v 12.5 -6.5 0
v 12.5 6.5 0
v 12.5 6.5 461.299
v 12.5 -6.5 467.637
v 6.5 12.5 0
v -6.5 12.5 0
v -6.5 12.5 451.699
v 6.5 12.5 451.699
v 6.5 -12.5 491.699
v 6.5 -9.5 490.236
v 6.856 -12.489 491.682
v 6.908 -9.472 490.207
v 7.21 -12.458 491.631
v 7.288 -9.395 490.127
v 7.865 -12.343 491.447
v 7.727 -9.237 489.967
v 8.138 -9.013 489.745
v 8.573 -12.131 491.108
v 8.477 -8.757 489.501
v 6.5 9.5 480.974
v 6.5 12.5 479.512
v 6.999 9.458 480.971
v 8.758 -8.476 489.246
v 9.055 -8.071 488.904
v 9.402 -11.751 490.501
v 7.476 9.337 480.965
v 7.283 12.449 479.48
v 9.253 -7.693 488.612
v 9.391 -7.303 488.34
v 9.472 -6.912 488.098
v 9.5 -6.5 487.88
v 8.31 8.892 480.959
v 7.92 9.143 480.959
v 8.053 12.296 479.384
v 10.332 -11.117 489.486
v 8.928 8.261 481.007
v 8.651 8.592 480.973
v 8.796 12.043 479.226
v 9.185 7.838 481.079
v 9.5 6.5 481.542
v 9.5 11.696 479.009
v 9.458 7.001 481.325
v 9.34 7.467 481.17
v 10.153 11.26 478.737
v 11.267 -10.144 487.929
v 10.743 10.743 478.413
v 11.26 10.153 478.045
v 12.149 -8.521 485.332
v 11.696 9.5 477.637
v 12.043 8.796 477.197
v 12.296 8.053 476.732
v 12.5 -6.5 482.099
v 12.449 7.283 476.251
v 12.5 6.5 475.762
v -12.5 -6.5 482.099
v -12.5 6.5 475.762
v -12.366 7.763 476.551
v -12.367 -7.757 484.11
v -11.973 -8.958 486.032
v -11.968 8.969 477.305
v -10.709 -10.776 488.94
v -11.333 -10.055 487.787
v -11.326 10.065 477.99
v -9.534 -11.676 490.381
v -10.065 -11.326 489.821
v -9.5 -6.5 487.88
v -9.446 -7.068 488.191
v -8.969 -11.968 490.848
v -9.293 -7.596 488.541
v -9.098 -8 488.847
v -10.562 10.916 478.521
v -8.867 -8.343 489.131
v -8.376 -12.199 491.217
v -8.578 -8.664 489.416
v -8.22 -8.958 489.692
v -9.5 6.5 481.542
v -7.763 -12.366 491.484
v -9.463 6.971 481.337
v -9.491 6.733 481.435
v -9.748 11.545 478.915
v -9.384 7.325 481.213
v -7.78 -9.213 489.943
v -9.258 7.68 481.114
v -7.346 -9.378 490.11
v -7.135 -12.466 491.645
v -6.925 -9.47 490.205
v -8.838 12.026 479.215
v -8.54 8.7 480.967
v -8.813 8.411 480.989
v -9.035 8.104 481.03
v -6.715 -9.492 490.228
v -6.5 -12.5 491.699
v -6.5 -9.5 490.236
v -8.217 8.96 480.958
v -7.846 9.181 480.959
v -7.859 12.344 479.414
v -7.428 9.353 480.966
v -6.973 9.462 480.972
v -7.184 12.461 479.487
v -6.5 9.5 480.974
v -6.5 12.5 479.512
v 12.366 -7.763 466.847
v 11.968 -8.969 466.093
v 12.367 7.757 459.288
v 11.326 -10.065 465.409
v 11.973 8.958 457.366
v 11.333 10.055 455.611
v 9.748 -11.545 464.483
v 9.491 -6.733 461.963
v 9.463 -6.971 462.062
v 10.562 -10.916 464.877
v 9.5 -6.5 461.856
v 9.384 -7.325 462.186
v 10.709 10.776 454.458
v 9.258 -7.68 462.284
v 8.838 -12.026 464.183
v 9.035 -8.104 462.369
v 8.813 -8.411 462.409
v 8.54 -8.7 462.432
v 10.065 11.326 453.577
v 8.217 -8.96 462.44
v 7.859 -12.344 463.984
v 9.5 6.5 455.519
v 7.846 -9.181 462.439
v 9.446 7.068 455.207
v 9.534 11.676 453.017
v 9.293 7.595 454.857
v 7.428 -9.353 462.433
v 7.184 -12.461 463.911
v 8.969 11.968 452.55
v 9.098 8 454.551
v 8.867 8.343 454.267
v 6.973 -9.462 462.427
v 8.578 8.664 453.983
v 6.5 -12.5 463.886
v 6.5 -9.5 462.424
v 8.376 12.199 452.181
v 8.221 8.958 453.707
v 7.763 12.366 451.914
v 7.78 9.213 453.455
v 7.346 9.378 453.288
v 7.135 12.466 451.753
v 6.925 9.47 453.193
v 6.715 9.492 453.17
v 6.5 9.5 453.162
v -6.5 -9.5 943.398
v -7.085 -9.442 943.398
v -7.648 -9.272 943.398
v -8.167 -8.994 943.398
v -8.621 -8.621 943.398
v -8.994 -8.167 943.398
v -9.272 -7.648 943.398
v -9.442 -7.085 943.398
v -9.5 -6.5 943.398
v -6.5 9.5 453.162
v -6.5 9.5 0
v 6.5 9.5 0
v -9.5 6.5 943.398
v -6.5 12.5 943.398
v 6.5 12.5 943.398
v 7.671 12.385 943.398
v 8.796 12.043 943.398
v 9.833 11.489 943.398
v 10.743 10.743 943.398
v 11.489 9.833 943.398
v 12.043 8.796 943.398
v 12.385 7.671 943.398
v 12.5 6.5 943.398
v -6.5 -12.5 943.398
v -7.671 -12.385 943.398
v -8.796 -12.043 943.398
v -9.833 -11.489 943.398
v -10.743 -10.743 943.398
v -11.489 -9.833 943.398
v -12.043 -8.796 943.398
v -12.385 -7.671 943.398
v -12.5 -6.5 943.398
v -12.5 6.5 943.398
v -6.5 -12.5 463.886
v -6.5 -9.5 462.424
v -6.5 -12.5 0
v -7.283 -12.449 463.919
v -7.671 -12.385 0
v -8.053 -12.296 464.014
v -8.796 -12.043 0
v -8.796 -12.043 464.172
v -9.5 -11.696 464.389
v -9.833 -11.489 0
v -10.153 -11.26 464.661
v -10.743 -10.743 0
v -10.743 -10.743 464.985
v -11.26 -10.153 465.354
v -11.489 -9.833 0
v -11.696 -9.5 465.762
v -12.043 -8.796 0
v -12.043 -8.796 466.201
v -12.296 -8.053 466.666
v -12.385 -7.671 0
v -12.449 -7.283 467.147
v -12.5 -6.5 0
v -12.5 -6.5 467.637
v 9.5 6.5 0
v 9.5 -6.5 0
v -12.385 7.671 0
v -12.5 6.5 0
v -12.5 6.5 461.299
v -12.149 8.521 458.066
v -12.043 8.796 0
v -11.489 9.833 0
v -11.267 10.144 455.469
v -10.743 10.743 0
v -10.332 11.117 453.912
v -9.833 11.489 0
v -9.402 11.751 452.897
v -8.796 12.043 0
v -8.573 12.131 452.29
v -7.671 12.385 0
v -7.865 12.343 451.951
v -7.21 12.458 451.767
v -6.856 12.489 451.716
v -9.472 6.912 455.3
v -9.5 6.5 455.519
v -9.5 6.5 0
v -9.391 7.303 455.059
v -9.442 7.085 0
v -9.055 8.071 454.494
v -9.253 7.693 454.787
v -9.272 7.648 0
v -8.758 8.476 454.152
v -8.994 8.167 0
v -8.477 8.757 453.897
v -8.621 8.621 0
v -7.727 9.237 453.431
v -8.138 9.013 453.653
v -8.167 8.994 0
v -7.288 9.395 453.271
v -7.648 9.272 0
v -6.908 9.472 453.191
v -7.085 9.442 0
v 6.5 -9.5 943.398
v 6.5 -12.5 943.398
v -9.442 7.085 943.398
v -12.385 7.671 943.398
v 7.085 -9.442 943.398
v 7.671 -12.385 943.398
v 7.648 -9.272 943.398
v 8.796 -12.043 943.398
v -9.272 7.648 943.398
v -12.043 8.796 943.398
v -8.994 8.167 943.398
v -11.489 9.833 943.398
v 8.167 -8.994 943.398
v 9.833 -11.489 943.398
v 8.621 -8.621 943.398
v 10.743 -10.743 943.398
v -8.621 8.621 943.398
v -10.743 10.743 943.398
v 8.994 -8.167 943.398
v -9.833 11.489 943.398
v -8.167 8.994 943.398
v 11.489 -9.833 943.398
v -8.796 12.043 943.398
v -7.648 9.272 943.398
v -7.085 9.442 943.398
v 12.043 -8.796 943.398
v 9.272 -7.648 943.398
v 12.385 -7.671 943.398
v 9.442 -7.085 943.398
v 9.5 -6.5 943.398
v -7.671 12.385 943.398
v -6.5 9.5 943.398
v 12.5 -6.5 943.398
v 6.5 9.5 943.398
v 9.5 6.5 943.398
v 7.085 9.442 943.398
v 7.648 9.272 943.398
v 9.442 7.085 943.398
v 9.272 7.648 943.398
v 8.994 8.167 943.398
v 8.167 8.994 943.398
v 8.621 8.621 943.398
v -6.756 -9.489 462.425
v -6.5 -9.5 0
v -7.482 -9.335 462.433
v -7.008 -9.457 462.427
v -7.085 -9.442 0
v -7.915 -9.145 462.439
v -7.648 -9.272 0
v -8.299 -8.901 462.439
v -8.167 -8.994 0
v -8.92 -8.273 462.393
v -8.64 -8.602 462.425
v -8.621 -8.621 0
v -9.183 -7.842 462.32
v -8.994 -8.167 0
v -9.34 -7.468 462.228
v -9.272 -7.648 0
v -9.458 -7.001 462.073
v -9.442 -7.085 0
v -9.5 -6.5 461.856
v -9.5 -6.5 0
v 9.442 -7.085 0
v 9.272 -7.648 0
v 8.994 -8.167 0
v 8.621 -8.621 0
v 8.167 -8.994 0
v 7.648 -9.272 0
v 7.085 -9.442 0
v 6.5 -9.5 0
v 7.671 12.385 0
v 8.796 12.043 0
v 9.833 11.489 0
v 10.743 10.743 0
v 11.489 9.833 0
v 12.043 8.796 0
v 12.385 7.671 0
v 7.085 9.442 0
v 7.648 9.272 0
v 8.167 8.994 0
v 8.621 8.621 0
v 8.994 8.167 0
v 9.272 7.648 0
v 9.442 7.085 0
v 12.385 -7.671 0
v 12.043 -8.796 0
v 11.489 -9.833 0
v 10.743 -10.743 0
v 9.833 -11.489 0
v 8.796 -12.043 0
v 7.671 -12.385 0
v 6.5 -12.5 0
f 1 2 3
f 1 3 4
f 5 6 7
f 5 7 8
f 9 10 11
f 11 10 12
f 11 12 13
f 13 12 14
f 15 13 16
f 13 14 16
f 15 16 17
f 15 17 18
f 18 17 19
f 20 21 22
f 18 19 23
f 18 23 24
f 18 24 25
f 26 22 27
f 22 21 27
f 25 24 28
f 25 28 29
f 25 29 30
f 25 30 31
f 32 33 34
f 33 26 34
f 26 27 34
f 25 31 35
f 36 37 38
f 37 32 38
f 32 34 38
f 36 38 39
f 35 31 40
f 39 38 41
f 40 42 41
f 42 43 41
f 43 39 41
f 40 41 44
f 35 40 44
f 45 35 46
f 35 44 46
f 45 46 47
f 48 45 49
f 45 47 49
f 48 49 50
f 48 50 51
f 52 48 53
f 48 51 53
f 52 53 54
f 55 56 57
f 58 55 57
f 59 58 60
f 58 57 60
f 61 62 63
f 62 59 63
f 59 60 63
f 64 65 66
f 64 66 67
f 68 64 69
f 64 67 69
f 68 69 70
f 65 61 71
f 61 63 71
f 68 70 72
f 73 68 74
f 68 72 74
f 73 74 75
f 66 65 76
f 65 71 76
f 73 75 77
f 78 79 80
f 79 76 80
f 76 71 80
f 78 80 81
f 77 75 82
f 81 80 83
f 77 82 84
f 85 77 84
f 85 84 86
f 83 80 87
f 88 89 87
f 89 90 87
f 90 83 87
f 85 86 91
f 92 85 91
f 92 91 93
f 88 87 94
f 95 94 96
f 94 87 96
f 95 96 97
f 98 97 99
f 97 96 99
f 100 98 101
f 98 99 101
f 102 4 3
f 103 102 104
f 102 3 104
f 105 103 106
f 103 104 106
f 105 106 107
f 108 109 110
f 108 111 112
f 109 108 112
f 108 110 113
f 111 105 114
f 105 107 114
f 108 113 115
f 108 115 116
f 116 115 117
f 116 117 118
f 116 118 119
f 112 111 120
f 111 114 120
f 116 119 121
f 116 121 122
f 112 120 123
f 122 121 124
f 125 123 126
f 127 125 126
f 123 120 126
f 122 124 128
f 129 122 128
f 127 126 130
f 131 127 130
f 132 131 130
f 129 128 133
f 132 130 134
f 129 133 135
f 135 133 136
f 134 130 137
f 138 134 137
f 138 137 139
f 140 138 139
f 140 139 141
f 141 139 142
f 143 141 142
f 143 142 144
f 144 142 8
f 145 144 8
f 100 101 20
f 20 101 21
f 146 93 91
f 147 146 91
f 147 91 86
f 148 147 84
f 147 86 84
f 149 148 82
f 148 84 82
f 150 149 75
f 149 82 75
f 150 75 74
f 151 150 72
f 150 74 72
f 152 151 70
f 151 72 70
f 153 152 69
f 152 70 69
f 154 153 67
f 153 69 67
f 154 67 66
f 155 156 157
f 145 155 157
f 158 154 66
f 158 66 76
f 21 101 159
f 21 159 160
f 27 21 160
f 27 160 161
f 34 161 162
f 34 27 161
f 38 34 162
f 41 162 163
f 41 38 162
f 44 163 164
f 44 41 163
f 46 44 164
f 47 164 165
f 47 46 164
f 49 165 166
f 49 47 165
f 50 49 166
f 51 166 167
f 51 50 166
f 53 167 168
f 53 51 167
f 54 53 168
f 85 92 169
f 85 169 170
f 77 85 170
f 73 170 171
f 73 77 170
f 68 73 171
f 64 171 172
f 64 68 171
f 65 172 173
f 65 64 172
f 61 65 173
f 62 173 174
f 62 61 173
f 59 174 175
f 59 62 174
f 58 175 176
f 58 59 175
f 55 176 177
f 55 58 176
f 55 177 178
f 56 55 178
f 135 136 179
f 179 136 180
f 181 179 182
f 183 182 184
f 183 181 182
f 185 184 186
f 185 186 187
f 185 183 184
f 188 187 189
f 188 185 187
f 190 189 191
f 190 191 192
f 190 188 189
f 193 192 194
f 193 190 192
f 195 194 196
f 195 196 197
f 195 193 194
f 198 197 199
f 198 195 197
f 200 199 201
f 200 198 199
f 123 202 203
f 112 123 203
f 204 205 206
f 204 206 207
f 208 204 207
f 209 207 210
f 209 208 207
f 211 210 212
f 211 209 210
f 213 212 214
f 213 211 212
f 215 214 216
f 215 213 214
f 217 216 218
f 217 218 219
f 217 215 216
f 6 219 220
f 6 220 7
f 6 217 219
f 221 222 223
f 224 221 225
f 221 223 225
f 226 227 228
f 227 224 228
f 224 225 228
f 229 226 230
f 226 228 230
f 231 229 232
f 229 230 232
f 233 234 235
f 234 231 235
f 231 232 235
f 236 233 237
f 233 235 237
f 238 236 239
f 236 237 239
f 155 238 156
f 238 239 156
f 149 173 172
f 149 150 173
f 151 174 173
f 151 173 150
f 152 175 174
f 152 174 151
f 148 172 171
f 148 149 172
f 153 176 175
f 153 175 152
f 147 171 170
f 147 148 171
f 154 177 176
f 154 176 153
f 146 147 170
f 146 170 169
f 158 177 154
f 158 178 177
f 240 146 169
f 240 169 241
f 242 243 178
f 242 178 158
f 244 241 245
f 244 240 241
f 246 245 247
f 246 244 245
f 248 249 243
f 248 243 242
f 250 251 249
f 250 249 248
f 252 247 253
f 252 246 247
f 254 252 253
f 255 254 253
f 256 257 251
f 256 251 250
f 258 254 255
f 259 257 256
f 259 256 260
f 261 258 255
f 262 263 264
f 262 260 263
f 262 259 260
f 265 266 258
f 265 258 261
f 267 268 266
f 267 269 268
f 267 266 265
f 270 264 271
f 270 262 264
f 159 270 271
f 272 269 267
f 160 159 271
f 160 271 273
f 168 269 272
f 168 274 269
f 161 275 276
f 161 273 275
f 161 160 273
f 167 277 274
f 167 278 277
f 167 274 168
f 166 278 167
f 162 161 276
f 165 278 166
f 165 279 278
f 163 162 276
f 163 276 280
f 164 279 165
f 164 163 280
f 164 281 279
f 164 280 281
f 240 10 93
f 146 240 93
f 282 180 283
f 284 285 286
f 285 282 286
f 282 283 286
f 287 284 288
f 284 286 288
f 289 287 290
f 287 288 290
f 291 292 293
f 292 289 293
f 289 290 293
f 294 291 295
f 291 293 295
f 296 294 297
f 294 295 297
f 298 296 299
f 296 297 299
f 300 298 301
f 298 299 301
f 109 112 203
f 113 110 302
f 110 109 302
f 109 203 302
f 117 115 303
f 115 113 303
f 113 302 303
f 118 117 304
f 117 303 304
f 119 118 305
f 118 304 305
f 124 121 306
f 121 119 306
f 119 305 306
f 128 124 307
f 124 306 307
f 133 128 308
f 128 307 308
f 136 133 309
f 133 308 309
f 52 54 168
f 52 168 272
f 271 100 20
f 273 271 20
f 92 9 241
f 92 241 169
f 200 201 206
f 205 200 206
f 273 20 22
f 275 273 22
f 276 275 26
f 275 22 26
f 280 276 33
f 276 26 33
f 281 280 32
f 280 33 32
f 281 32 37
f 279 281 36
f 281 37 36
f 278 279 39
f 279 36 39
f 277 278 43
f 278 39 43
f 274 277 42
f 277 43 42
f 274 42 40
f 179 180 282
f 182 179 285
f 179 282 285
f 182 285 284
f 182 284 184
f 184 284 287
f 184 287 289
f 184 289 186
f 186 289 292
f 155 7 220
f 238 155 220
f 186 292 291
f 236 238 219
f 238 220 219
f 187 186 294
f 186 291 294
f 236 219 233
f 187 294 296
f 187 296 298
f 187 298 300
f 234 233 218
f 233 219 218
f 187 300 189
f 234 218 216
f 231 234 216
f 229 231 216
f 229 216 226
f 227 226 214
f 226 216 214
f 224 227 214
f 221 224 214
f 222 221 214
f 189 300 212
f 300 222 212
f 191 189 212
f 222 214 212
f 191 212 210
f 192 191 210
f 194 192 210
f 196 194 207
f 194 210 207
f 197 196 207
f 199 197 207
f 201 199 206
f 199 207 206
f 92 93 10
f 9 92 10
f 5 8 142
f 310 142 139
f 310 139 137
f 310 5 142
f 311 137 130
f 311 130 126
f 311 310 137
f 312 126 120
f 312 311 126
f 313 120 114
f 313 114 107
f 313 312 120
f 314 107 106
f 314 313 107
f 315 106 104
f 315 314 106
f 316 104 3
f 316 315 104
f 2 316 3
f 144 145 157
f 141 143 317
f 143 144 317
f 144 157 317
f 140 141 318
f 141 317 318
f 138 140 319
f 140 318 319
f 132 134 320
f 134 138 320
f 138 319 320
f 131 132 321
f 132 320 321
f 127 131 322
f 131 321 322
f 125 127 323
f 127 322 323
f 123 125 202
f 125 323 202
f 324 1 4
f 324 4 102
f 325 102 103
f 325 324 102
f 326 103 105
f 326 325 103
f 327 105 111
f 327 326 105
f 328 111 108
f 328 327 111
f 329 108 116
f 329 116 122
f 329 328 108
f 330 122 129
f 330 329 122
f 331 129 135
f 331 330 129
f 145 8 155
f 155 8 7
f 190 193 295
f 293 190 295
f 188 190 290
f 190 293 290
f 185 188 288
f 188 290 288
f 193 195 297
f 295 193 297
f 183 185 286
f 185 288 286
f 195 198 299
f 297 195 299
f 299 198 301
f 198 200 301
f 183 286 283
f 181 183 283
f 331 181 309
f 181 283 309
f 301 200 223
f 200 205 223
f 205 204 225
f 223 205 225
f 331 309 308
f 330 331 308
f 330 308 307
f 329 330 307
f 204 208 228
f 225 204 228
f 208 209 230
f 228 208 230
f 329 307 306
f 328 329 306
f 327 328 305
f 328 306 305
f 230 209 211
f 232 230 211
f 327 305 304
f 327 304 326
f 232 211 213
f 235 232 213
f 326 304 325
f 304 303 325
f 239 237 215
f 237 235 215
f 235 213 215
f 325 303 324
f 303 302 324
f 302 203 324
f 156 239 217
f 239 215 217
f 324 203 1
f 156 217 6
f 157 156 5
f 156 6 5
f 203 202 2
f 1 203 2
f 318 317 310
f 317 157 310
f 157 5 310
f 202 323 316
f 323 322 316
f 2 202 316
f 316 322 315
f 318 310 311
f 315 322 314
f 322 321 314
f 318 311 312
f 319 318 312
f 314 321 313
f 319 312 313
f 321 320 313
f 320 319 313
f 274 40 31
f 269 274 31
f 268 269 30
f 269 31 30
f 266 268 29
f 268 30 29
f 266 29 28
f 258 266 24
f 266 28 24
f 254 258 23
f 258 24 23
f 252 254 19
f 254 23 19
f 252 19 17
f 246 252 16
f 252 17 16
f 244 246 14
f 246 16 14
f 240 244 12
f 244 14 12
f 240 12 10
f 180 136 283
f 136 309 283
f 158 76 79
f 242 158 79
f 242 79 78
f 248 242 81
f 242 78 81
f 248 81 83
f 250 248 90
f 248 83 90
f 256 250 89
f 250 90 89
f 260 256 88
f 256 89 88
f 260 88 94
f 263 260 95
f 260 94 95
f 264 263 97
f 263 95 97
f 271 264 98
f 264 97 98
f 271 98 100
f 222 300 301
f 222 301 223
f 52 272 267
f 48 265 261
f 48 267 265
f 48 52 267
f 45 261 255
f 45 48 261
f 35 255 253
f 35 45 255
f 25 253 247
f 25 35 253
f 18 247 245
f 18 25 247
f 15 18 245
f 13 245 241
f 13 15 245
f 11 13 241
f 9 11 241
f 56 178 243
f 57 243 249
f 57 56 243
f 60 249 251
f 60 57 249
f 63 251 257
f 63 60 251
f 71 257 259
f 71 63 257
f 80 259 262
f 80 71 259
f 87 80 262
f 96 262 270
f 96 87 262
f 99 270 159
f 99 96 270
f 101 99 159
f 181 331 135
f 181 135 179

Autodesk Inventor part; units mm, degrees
ref_plane "Start plane" through (0, 0, 0) normal (0, 0, 1) x (1, 0, 0)
ref_plane "End plane" through (0, 0, 943.3981) normal (0, 0, 1) x (1, 0, 0)
sketch "Sketch" plane through (0, 0, 0) normal (0, 0, 1) x (1, 0, 0)
  line L0 (-12.5, -6.5) -> (-12.5, 6.5)
  line L1 (-6.5, 12.5) -> (6.5, 12.5)
  line L2 (12.5, 6.5) -> (12.5, -6.5)
  line L3 (6.5, -12.5) -> (-6.5, -12.5)
  arc A0 (-12.5, -6.5) -> (-6.5, -12.5) centre (-6.5, -6.5) ccw
  arc A1 (-6.5, 12.5) -> (-12.5, 6.5) centre (-6.5, 6.5) ccw
  arc A2 (12.5, 6.5) -> (6.5, 12.5) centre (6.5, 6.5) ccw
  arc A3 (6.5, -12.5) -> (12.5, -6.5) centre (6.5, -6.5) ccw
  arc A4 (-6.5, 9.5) -> (-9.5, 6.5) centre (-6.5, 6.5) ccw
  line L4 (-6.5, 9.5) -> (6.5, 9.5)
  arc A5 (9.5, 6.5) -> (6.5, 9.5) centre (6.5, 6.5) ccw
  line L5 (9.5, 6.5) -> (9.5, -6.5)
  arc A6 (6.5, -9.5) -> (9.5, -6.5) centre (6.5, -6.5) ccw
  line L6 (6.5, -9.5) -> (-6.5, -9.5)
  arc A7 (-9.5, -6.5) -> (-6.5, -9.5) centre (-6.5, -6.5) ccw
  line L7 (-9.5, -6.5) -> (-9.5, 6.5)
  line L8 (0, 19.2397) -> (0, -19.2397) construction
  line L9 (-19.2397, 0) -> (19.2397, 0) construction
  dimension "d7" = 6
  dimension "d10" = 25
  dimension "d11" = 25
  dimension "d12" = 3
  dimension "d15" = 12.5
  dimension "d16" = 12.5
extrude "Body" add sketch "Sketch" along normal up to surface (943.3981 mm away) from surface at 0
sketch "Sketch3" plane through (0, 0, 0) normal (0, 0, 1) x (1, 0, 0)
  line L0 (0, 0) -> (10, 0)
ref_plane "Work Plane3" through (0, 0, 0) normal (0, -1, 0) x (1, 0, 0)
sketch "Sketch4" plane through (0, 0, 0) normal (0, -1, 0) x (1, 0, 0)
  line L0 (-2, 0) -> (12, 0)
  line L1 (-2, 943.3981) -> (12, 943.3981)
  dimension "d18" = 943.3981
ref_plane "Work Plane4" through (0, 423.9992, 264.9995) normal (0, -0.8989, 0.4382) x (1, 0, 0)
ref_plane "Work Plane5" through (0, -423.9992, 678.3986) normal (0, -0.8989, 0.4382) x (1, 0, 0)
ref_plane "Work Plane6" through (0, 0, 471.6991) normal (0, -0.8989, 0.4382) x (1, 0, 0)
sketch "Sketch5" plane through (0, 0, 471.6991) normal (0, -0.8989, 0.4382) x (1, 0, 0)
  arc A0 (-12.5, -6.5) -> (-6.5, -12.5) centre (-6.5, -6.5) ccw
  line L0 (-12.5, -6.5) -> (-12.5, 6.5)
  arc A1 (-6.5, 12.5) -> (-12.5, 6.5) centre (-6.5, 6.5) ccw
  line L1 (-6.5, 12.5) -> (6.5, 12.5)
  arc A2 (12.5, 6.5) -> (6.5, 12.5) centre (6.5, 6.5) ccw
  line L2 (12.5, 6.5) -> (12.5, -6.5)
  arc A3 (6.5, -12.5) -> (12.5, -6.5) centre (6.5, -6.5) ccw
  line L3 (6.5, -12.5) -> (-6.5, -12.5)
  arc A4 (-6.5, 9.5) -> (-9.5, 6.5) centre (-6.5, 6.5) ccw
  line L4 (-6.5, 9.5) -> (6.5, 9.5)
  arc A5 (9.5, 6.5) -> (6.5, 9.5) centre (6.5, 6.5) ccw
  line L5 (9.5, 6.5) -> (9.5, -6.5)
  arc A6 (6.5, -9.5) -> (9.5, -6.5) centre (6.5, -6.5) ccw
  line L6 (6.5, -9.5) -> (-6.5, -9.5)
  arc A7 (-9.5, -6.5) -> (-6.5, -9.5) centre (-6.5, -6.5) ccw
  line L7 (-9.5, -6.5) -> (-9.5, 6.5)
extrude "Extrusion2" cut sketch "Sketch5" along normal up to surface (943.3981 mm away) from surface at -471.6991 contours L0 A1 L1 A2 L2 A3 L3 A0 | L4 A5 L5 A6 L6 A7 L7 A4
equation "\"d7\" = G_IR"
equation "\"d10\" = G_H"
equation "\"d11\" = G_W"
equation "\"d12\" = G_T"
equation "\"d15\" = 0.5 * d10"
equation "\"d16\" = 0.5 * d11"
equation "\"d3\" = G_L"
equation "\"G_W\" = 25"
equation "\"G_H\" = 25"
equation "\"G_T\" = 3"
equation "\"G_IR\" = 6"
equation "\"G_L\" = d18"
equation "\"G_OFFSET_START\" = 0"
equation "\"G_OFFSET_END\" = 0"
equation "\"d14\" = G_OFFSET_END + B_L"
equation "\"B_L\" = 943.39811"
properties part number "AS 1163 - C350L0 25x25x3.0 SHS - 943.398" material "Steel, Mild"
